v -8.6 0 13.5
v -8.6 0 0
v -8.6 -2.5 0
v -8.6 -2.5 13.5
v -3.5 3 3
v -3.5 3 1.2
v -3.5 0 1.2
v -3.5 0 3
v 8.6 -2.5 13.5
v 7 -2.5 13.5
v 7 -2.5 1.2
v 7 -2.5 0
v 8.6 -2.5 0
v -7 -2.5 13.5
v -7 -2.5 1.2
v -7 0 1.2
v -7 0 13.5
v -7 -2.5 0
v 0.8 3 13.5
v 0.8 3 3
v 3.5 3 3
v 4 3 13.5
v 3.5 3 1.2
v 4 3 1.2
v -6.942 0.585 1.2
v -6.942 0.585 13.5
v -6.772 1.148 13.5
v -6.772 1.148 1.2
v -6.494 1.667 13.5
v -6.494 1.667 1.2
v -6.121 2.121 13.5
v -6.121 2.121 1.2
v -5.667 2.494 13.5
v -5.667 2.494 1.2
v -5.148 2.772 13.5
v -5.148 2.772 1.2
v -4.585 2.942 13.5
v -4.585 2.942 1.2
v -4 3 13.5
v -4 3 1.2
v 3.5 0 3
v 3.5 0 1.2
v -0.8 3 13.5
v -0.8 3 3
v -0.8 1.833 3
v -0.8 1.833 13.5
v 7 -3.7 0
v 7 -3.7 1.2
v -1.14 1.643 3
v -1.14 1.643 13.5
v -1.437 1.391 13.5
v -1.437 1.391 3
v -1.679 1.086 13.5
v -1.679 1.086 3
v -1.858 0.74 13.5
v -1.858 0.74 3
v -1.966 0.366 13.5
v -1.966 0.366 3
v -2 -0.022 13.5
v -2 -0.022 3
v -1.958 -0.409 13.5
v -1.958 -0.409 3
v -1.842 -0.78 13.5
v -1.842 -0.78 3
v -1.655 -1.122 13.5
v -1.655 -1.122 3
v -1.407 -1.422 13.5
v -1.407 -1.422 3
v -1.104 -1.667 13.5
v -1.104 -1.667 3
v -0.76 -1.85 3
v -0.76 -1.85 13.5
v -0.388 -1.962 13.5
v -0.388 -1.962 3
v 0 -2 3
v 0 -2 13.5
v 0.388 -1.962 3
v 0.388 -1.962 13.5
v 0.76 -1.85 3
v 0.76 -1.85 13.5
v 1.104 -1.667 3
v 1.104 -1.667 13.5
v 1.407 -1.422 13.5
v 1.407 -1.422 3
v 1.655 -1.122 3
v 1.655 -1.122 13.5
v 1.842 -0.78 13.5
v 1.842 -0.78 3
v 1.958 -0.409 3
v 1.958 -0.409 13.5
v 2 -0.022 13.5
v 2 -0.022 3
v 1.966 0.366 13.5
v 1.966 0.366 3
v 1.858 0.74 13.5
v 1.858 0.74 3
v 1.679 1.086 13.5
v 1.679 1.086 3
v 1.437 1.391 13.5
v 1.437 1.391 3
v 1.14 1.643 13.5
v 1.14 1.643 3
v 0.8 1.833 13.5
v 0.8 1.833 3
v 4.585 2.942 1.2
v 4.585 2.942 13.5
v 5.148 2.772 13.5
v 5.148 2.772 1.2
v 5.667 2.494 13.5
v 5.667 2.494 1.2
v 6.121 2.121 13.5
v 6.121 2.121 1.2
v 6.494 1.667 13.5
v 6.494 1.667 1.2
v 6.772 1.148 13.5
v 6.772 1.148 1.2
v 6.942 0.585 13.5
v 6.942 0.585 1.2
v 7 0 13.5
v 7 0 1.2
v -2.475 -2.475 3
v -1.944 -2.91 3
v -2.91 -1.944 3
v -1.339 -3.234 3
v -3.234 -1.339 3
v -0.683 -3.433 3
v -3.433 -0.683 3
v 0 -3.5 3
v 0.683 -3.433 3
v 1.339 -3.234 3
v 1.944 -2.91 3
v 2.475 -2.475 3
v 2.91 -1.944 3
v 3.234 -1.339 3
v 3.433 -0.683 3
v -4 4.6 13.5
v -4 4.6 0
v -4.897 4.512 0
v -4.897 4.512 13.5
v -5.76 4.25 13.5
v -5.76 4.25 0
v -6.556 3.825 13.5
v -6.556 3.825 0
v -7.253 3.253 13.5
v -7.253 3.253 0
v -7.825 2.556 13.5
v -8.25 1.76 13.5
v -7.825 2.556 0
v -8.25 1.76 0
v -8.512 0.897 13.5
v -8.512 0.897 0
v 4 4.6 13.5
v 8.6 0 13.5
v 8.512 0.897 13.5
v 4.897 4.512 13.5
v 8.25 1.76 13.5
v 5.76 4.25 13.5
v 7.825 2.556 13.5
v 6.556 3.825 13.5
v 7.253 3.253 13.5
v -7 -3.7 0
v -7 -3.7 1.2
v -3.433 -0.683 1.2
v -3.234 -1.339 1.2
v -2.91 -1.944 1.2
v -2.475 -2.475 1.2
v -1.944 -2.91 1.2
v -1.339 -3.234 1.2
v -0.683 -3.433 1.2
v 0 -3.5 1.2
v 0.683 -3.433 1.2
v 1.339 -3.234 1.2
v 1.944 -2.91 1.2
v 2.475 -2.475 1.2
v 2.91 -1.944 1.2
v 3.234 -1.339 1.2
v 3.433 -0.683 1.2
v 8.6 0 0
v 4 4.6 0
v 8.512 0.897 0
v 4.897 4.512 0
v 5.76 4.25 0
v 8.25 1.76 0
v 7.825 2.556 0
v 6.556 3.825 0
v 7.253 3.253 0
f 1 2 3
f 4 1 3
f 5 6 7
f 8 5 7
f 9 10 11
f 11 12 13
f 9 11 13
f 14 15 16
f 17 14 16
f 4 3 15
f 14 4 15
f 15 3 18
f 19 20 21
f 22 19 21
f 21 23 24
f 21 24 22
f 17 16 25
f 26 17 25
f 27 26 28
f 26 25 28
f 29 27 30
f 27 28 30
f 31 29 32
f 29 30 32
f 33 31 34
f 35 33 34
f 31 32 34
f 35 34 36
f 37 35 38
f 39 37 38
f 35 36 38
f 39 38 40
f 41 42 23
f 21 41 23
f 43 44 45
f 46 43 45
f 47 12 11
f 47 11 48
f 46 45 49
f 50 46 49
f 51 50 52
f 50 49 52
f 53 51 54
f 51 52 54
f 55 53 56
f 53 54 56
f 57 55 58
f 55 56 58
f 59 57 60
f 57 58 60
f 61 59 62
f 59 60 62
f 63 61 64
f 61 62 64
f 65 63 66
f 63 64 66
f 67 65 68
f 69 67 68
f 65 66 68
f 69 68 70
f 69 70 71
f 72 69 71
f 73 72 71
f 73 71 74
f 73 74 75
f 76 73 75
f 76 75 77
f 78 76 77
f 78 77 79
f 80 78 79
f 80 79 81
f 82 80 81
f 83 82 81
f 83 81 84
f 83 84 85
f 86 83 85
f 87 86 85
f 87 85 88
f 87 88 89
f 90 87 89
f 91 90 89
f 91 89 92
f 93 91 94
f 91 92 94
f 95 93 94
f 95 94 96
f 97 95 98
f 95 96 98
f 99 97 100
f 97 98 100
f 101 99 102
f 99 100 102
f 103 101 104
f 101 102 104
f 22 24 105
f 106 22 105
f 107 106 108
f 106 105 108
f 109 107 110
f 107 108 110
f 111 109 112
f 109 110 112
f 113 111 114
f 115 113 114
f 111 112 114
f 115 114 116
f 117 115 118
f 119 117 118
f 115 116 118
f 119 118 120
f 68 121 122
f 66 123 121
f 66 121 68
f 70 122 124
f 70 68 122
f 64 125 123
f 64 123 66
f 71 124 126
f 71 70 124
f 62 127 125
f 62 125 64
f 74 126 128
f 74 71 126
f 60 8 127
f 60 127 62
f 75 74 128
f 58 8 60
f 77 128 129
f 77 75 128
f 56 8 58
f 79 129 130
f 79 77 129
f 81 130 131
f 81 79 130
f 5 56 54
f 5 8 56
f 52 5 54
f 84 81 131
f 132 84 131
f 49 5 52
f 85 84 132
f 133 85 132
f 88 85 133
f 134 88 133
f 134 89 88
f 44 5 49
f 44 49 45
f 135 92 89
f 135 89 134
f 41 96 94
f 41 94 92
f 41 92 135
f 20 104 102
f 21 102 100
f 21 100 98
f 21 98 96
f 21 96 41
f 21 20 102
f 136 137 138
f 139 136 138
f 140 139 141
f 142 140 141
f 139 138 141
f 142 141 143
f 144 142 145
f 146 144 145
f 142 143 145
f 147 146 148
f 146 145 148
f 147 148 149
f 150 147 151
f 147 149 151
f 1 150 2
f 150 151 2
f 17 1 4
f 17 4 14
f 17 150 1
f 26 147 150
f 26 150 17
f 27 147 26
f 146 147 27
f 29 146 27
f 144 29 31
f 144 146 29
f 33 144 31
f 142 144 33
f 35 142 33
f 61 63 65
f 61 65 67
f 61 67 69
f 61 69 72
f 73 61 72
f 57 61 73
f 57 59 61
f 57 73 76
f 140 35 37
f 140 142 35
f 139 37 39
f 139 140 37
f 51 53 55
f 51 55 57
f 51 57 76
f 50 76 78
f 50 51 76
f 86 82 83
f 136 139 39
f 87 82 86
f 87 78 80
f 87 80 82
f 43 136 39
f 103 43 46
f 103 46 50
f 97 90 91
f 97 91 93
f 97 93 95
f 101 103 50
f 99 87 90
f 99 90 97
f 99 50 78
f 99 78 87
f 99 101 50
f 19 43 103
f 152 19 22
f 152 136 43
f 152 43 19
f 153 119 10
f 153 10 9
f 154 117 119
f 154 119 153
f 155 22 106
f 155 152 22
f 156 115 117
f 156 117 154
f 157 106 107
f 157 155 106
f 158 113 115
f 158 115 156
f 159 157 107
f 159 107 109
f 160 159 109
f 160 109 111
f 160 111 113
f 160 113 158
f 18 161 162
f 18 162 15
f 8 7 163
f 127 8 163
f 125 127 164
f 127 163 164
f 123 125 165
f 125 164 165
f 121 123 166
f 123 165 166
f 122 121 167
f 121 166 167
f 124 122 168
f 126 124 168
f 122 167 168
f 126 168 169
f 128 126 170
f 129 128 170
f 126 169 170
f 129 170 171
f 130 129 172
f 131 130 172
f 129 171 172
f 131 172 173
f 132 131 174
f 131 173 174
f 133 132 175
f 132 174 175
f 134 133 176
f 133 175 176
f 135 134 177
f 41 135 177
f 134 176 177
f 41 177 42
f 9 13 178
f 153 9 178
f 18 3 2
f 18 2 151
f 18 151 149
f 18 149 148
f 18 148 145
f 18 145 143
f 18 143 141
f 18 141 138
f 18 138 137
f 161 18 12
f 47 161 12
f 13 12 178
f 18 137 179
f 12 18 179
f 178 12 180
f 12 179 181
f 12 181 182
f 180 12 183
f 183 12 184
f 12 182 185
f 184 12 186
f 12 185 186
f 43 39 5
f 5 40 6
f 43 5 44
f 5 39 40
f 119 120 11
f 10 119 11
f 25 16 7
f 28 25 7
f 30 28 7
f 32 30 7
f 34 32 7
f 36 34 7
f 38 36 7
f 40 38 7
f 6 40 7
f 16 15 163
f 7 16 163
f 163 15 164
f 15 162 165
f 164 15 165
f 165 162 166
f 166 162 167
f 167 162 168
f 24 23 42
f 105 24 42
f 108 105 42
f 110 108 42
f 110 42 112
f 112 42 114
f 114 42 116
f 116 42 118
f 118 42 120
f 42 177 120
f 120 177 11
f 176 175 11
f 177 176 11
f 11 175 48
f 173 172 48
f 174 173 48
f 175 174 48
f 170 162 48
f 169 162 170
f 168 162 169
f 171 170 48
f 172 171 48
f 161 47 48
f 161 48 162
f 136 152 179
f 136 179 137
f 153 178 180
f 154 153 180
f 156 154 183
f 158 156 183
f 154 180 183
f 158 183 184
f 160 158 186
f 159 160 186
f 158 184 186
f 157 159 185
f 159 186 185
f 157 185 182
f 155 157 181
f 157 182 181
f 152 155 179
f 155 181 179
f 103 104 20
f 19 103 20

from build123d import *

# Parameters (mm, degrees)
F1_DEPTH = 13.5
F3_DEPTH = 1.2
F5_DEPTH = 1.8


with BuildPart() as f1:
    # F0 (on Top) → F1 (new body)
    with BuildSketch(Plane.XY):
        with BuildLine():
            Line((-8.6, 0), (-8.6, -2.5))
            Line((-8.6, -2.5), (-7, -2.5))
            Line((-7, -2.5), (-7, 0))
            ThreePointArc((-7, 0), (-6.12132, 2.12132), (-4, 3))
            Line((-4, 3), (-0.8, 3))
            Line((-0.8, 3), (-0.8, 1.83303))
            ThreePointArc((-0.8, 1.83303), (0, -2), (0.8, 1.83303))
            Line((0.8, 1.83303), (0.8, 3))
            Line((0.8, 3), (4, 3))
            ThreePointArc((4, 3), (6.12132, 2.12132), (7, 0))
            Line((7, 0), (7, -2.5))
            Line((7, -2.5), (8.6, -2.5))
            Line((8.6, -2.5), (8.6, 0))
            ThreePointArc((8.6, 0), (7.252691, 3.252691), (4, 4.6))
            Line((4, 4.6), (-4, 4.6))
            ThreePointArc((-4, 4.6), (-7.252691, 3.252691), (-8.6, 0))
        make_face()
    extrude(amount=F1_DEPTH)

    # F2 (on face) → F3 (join)
    with BuildSketch(Plane(origin=(0, 0, 0), x_dir=(1, 0, 0), z_dir=(0, 0, -1))):
        with BuildLine():
            Line((-7, 2.5), (-8.6, 2.5))
            Line((-8.6, 2.5), (-8.6, 0))
            ThreePointArc((-8.6, 0), (-7.252691, -3.252691), (-4, -4.6))
            Line((-4, -4.6), (4, -4.6))
            ThreePointArc((4, -4.6), (7.252691, -3.252691), (8.6, 0))
            Line((8.6, 0), (8.6, 2.5))
            Line((8.6, 2.5), (7, 2.5))
            Line((7, 2.5), (7, 3.7))
            Line((7, 3.7), (-7, 3.7))
            Line((-7, 3.7), (-7, 2.5))
        make_face()
    extrude(amount=-F3_DEPTH)

    # F4 (on face) → F5 (join)
    with BuildSketch(Plane.XY.offset(1.2)):
        with BuildLine():
            Line((-3.5, 3), (-3.5, 0))
            ThreePointArc((-3.5, 0), (0, -3.5), (3.5, 0))
            Line((3.5, 0), (3.5, 3))
            Line((3.5, 3), (-3.5, 3))
        make_face()
    extrude(amount=F5_DEPTH)


solid = f1.part
